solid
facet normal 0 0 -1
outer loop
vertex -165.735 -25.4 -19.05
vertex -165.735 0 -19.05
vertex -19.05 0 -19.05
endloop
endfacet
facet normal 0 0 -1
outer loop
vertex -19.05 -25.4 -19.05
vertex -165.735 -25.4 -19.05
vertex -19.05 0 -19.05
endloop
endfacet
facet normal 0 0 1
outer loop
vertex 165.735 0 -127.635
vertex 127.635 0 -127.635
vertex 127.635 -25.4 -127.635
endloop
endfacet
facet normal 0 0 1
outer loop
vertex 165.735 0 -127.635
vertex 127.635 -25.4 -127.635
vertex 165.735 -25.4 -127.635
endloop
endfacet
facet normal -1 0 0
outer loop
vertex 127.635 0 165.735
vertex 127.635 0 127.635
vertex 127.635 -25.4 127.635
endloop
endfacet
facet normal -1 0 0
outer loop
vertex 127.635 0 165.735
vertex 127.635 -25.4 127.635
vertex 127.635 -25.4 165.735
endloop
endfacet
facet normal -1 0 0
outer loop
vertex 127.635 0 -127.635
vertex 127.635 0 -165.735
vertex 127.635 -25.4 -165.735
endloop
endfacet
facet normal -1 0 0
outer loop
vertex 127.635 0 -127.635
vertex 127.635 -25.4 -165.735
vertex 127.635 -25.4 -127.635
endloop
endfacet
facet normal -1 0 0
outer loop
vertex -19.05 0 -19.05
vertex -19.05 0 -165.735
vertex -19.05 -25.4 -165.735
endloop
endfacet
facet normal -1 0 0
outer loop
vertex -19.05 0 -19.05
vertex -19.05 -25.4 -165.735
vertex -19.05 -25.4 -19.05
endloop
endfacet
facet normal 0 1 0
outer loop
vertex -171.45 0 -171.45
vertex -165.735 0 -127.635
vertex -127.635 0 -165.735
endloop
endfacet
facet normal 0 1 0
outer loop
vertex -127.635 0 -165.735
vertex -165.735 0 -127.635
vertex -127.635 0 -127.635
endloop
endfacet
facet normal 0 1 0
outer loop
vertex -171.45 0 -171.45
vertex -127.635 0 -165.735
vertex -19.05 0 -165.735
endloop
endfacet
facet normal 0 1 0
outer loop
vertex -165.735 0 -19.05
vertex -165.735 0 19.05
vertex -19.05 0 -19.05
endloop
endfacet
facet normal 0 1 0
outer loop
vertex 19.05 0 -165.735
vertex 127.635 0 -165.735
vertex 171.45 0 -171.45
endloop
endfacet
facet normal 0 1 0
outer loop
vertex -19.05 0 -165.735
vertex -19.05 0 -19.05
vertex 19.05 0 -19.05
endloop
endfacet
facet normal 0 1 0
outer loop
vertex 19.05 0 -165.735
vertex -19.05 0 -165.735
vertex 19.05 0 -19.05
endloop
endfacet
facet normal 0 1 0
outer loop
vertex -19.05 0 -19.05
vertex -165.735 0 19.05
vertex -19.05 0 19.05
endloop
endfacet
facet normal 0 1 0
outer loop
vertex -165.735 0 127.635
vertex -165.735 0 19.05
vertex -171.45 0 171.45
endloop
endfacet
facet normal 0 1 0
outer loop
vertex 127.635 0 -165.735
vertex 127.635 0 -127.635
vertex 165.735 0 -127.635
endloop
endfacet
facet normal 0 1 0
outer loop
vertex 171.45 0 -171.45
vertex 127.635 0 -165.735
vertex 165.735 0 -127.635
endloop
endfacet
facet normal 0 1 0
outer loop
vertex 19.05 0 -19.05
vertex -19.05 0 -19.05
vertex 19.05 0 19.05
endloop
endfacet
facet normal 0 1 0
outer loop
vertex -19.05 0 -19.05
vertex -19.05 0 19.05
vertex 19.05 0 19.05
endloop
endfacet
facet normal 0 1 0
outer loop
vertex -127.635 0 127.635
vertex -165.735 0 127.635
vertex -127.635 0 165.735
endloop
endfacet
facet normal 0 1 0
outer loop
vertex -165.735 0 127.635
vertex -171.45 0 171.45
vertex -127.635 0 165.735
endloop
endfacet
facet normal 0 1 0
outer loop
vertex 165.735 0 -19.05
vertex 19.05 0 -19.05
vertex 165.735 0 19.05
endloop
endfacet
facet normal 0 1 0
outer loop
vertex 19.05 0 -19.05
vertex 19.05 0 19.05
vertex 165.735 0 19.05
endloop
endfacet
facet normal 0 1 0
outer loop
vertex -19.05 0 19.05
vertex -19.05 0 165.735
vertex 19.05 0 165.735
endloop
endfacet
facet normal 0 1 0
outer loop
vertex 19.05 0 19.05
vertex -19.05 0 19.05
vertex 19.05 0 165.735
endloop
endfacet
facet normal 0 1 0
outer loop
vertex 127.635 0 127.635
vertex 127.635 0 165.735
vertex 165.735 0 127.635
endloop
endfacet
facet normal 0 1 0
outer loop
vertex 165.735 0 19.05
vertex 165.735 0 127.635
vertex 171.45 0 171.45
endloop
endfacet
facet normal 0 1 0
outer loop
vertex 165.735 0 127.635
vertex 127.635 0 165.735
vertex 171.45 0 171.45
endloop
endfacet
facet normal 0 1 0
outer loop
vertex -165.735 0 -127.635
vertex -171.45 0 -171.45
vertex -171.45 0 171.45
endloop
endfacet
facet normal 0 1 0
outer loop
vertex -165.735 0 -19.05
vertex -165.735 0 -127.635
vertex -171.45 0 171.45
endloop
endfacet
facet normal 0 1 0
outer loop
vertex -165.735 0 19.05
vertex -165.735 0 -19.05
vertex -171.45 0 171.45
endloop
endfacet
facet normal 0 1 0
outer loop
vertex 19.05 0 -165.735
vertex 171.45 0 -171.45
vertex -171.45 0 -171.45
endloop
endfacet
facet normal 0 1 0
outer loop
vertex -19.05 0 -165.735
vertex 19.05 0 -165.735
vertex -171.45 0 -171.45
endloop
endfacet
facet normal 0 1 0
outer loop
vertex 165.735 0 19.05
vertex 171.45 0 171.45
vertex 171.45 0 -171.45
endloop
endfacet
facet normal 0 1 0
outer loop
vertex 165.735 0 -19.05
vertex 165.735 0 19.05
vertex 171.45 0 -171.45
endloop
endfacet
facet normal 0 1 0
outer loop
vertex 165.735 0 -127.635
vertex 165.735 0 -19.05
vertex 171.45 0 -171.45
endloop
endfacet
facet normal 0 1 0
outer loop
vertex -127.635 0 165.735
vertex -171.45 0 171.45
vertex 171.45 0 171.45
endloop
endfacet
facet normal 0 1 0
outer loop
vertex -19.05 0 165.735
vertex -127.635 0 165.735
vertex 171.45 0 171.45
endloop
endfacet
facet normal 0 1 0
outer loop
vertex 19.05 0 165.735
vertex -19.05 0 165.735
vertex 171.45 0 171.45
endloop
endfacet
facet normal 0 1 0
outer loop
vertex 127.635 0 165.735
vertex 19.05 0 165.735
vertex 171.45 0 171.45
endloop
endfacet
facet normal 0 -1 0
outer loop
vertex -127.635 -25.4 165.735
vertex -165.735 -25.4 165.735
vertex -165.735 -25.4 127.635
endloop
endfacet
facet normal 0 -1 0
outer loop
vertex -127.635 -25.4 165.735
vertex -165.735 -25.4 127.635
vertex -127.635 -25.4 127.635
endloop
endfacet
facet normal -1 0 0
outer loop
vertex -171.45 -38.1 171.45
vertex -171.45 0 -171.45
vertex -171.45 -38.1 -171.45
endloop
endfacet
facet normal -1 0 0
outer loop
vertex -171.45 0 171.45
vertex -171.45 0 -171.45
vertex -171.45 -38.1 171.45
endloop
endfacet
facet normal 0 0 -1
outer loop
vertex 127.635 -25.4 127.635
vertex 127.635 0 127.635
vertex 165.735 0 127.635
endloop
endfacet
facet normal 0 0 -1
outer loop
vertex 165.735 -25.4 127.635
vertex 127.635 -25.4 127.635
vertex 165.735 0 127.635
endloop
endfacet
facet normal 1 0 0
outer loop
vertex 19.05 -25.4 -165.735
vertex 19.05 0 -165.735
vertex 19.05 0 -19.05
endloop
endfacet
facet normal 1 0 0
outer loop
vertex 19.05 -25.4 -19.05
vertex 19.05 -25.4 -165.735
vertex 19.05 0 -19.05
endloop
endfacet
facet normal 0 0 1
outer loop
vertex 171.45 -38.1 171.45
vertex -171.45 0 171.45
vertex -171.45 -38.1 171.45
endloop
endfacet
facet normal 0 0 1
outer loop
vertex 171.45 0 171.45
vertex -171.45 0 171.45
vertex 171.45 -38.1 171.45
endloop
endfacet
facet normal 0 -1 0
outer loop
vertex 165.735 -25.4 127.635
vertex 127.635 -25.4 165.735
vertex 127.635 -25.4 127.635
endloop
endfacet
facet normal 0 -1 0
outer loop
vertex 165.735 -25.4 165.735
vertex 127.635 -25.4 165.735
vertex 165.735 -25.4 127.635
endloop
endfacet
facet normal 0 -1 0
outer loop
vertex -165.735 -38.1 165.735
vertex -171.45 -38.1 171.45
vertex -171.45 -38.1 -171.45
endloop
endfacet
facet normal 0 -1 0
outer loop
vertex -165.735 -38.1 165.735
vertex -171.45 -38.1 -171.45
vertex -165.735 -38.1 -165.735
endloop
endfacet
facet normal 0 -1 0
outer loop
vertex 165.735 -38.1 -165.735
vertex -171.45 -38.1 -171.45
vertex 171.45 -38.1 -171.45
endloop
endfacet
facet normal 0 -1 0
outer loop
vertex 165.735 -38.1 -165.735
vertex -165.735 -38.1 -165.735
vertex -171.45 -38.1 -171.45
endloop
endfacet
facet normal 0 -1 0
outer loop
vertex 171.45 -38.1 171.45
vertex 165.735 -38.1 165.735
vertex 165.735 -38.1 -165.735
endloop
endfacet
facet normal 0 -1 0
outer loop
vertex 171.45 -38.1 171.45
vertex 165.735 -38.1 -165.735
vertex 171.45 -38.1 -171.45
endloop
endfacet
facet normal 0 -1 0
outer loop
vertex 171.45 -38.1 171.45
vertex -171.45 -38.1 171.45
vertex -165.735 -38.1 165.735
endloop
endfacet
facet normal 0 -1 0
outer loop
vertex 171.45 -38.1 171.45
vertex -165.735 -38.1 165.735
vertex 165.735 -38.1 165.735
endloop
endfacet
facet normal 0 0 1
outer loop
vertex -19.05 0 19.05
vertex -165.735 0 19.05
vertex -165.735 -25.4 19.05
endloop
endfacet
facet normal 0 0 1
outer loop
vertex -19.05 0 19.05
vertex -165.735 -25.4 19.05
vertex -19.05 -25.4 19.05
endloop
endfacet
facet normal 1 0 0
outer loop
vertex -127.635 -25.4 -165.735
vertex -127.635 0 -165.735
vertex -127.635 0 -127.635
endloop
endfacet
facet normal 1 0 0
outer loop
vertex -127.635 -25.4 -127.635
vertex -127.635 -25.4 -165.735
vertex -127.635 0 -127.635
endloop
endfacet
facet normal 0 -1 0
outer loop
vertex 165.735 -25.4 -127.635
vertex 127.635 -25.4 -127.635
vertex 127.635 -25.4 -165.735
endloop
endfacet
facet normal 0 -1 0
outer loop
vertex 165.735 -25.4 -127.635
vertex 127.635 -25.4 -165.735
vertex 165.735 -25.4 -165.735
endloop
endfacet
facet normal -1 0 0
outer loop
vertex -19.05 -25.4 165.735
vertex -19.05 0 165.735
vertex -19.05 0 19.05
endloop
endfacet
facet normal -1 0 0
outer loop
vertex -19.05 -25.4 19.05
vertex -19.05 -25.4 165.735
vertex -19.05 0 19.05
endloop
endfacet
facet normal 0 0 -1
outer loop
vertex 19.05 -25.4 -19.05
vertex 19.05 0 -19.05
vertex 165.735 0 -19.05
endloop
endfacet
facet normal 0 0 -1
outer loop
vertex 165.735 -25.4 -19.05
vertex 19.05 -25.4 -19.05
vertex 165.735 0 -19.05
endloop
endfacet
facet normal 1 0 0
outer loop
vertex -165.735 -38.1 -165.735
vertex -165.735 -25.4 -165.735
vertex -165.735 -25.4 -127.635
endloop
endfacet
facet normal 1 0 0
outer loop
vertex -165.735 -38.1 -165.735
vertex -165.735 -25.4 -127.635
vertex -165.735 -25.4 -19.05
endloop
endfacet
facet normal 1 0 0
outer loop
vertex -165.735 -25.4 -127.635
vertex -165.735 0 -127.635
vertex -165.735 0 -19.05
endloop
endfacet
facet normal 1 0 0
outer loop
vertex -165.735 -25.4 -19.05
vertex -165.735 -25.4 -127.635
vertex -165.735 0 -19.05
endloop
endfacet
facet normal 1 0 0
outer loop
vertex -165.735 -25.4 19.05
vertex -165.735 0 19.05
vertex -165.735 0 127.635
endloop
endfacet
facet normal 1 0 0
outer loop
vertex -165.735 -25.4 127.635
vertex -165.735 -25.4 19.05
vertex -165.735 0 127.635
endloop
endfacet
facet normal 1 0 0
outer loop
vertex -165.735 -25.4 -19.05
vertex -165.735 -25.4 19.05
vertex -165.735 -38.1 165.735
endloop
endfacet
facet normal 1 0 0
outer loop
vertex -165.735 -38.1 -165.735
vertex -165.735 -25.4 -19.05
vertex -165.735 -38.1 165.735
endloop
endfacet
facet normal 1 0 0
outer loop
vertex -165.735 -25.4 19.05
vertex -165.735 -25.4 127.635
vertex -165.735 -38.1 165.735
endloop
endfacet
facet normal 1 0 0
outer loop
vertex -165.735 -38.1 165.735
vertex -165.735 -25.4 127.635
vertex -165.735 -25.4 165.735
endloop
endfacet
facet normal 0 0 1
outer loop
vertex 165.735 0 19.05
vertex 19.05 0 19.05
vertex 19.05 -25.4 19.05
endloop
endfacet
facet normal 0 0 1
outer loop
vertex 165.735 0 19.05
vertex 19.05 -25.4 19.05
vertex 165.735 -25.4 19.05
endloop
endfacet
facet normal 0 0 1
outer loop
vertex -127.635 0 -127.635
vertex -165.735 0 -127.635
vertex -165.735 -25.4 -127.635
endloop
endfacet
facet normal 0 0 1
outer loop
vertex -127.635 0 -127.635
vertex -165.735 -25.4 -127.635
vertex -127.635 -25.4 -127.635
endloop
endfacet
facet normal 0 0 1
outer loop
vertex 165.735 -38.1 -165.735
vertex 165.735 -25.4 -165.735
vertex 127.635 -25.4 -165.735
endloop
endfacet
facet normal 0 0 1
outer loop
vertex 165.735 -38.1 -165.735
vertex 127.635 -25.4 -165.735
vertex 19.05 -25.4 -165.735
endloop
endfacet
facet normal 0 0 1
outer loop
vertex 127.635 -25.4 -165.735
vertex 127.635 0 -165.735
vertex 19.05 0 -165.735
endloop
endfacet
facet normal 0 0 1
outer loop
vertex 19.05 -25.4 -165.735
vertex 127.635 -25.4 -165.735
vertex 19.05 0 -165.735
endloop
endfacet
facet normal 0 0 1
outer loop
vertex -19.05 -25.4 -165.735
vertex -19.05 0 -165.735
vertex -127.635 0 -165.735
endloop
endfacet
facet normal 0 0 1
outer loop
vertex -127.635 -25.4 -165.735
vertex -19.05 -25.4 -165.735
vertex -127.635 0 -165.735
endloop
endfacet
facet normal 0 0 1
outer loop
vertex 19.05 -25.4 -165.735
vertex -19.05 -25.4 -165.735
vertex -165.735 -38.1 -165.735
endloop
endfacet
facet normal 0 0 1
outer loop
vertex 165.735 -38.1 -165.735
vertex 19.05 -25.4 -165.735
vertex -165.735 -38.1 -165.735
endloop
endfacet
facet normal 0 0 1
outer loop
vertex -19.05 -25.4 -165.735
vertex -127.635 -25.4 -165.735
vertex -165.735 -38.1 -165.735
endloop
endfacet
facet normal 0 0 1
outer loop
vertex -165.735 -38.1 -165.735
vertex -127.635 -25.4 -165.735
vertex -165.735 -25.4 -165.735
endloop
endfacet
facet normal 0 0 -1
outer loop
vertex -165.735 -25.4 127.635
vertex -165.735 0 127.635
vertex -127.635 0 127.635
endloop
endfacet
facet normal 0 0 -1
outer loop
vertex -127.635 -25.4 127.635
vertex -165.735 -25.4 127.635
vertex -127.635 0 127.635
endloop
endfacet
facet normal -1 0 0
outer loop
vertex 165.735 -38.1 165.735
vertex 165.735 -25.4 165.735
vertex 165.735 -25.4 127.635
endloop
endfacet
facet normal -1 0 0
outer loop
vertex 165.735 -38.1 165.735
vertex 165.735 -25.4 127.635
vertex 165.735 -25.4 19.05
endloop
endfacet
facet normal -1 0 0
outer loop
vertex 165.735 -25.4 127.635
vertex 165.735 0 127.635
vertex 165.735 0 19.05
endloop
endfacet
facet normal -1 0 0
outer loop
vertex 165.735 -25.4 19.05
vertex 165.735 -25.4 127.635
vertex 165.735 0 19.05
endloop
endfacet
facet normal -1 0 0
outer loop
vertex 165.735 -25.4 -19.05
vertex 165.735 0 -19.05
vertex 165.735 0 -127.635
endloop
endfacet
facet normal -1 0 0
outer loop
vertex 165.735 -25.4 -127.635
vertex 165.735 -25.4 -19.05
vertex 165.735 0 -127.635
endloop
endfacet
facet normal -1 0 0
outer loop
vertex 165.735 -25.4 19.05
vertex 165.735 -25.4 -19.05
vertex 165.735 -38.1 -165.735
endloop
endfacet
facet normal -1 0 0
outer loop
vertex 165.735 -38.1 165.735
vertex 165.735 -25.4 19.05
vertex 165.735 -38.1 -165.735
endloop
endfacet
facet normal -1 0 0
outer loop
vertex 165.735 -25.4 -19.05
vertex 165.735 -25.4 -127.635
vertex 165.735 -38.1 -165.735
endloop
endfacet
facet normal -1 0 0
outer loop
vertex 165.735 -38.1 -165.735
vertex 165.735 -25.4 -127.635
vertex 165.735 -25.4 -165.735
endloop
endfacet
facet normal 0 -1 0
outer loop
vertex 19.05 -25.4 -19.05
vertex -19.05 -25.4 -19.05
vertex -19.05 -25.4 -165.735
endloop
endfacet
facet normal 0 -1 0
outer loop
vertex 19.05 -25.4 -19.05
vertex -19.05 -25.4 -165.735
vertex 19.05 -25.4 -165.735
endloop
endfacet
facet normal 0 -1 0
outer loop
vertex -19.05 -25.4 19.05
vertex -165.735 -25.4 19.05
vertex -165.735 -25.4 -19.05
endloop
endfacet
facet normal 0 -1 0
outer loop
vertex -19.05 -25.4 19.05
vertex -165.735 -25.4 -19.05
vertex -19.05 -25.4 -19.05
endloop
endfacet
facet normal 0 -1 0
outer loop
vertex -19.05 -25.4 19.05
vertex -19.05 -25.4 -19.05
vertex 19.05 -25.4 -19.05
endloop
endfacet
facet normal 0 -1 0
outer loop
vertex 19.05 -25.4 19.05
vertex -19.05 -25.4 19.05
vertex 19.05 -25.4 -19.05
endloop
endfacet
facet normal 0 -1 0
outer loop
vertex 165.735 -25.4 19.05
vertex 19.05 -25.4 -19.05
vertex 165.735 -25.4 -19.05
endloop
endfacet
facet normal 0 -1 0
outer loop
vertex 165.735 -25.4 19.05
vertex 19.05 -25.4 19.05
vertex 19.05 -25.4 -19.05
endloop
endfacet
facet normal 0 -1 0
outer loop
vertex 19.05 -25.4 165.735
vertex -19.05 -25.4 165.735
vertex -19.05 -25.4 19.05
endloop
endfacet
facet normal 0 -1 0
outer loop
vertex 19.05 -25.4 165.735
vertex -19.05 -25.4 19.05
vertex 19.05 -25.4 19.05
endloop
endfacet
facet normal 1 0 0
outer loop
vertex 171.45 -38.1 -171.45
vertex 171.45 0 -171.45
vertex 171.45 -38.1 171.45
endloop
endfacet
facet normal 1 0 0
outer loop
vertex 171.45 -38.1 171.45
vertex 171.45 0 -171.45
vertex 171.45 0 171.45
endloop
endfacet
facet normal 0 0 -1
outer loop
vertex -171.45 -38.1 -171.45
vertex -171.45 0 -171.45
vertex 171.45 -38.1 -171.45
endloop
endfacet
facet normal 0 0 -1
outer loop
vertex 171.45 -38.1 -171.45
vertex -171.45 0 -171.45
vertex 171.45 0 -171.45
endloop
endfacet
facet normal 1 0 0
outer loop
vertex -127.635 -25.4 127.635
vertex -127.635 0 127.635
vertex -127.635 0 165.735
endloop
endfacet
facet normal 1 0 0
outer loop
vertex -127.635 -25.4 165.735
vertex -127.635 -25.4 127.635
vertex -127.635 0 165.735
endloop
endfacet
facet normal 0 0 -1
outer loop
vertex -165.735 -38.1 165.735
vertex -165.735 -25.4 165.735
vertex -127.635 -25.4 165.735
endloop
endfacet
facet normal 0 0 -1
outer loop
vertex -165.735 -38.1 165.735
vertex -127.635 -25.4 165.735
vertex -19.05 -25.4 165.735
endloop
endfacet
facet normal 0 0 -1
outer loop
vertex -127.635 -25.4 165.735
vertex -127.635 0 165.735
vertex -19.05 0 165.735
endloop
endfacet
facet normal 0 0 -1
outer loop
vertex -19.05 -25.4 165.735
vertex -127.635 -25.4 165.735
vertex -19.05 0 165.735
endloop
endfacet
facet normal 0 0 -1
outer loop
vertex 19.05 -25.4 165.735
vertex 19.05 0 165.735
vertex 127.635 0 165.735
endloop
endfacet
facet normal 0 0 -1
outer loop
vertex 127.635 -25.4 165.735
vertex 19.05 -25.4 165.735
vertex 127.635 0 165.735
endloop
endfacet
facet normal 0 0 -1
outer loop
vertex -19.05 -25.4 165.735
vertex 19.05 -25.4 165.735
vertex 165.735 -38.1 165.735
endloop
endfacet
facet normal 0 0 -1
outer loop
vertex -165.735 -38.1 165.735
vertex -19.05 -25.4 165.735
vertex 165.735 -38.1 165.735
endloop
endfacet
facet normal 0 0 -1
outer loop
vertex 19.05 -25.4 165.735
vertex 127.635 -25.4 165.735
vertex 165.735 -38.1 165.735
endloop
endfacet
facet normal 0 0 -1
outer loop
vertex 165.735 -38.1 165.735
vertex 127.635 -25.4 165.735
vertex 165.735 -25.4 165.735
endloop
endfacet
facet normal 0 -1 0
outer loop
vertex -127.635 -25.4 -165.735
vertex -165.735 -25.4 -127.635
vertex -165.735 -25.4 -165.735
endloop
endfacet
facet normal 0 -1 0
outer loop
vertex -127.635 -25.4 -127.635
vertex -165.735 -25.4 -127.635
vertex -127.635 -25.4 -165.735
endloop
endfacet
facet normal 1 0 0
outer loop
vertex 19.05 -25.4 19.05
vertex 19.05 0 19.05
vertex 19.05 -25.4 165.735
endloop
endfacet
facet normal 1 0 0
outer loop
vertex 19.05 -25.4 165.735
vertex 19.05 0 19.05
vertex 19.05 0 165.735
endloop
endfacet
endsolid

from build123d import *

# Parameters (mm, degrees)
F0_W     = 342.9
F0_H     = 342.9
F1_DEPTH = 38.1
F0_W_2   = 38.1
F0_H_2   = 146.685
F0_H_3   = 38.1
F0_W_3   = 146.685
F2_DEPTH = 25.4


with BuildPart() as f1:
    # F0 (on Front) → F1 (new body)
    with BuildSketch(Plane.XZ):
        Rectangle(F0_W, F0_H)
        Polygon((127.635, 165.735), (165.735, 165.735), (165.735, 127.635), (165.735, 19.05), (165.735, -19.05), (165.735, -127.635), (165.735, -165.735), (127.635, -165.735), (19.05, -165.735), (-19.05, -165.735), (-127.635, -165.735), (-165.735, -165.735), (-165.735, -127.635), (-165.735, -19.05), (-165.735, 19.05), (-165.735, 127.635), (-165.735, 165.735), (-127.635, 165.735), (-19.05, 165.735), (19.05, 165.735), align=None, mode=Mode.SUBTRACT)
    extrude(amount=F1_DEPTH)

    # F0 (on Front) → F2 (join)
    with BuildSketch(Plane.XZ):
        with Locations((0, 92.3925)):
            Rectangle(F0_W_2, F0_H_2)
        with Locations((146.685, -146.685)):
            Rectangle(F0_W_2, F0_H_3)
        Rectangle(F0_W_2, F0_H_3)
        with Locations((146.685, 146.685)):
            Rectangle(F0_W_2, F0_H_3)
        with Locations((-92.3925, 0)):
            Rectangle(F0_W_3, F0_H_3)
        with Locations((92.3925, 0)):
            Rectangle(F0_W_3, F0_H_3)
        with Locations((-146.685, -146.685)):
            Rectangle(F0_W_2, F0_H_3)
        with Locations((0, -92.3925)):
            Rectangle(F0_W_2, F0_H_2)
        with Locations((-146.685, 146.685)):
            Rectangle(F0_W_2, F0_H_3)
    extrude(amount=F2_DEPTH)


solid = f1.part
